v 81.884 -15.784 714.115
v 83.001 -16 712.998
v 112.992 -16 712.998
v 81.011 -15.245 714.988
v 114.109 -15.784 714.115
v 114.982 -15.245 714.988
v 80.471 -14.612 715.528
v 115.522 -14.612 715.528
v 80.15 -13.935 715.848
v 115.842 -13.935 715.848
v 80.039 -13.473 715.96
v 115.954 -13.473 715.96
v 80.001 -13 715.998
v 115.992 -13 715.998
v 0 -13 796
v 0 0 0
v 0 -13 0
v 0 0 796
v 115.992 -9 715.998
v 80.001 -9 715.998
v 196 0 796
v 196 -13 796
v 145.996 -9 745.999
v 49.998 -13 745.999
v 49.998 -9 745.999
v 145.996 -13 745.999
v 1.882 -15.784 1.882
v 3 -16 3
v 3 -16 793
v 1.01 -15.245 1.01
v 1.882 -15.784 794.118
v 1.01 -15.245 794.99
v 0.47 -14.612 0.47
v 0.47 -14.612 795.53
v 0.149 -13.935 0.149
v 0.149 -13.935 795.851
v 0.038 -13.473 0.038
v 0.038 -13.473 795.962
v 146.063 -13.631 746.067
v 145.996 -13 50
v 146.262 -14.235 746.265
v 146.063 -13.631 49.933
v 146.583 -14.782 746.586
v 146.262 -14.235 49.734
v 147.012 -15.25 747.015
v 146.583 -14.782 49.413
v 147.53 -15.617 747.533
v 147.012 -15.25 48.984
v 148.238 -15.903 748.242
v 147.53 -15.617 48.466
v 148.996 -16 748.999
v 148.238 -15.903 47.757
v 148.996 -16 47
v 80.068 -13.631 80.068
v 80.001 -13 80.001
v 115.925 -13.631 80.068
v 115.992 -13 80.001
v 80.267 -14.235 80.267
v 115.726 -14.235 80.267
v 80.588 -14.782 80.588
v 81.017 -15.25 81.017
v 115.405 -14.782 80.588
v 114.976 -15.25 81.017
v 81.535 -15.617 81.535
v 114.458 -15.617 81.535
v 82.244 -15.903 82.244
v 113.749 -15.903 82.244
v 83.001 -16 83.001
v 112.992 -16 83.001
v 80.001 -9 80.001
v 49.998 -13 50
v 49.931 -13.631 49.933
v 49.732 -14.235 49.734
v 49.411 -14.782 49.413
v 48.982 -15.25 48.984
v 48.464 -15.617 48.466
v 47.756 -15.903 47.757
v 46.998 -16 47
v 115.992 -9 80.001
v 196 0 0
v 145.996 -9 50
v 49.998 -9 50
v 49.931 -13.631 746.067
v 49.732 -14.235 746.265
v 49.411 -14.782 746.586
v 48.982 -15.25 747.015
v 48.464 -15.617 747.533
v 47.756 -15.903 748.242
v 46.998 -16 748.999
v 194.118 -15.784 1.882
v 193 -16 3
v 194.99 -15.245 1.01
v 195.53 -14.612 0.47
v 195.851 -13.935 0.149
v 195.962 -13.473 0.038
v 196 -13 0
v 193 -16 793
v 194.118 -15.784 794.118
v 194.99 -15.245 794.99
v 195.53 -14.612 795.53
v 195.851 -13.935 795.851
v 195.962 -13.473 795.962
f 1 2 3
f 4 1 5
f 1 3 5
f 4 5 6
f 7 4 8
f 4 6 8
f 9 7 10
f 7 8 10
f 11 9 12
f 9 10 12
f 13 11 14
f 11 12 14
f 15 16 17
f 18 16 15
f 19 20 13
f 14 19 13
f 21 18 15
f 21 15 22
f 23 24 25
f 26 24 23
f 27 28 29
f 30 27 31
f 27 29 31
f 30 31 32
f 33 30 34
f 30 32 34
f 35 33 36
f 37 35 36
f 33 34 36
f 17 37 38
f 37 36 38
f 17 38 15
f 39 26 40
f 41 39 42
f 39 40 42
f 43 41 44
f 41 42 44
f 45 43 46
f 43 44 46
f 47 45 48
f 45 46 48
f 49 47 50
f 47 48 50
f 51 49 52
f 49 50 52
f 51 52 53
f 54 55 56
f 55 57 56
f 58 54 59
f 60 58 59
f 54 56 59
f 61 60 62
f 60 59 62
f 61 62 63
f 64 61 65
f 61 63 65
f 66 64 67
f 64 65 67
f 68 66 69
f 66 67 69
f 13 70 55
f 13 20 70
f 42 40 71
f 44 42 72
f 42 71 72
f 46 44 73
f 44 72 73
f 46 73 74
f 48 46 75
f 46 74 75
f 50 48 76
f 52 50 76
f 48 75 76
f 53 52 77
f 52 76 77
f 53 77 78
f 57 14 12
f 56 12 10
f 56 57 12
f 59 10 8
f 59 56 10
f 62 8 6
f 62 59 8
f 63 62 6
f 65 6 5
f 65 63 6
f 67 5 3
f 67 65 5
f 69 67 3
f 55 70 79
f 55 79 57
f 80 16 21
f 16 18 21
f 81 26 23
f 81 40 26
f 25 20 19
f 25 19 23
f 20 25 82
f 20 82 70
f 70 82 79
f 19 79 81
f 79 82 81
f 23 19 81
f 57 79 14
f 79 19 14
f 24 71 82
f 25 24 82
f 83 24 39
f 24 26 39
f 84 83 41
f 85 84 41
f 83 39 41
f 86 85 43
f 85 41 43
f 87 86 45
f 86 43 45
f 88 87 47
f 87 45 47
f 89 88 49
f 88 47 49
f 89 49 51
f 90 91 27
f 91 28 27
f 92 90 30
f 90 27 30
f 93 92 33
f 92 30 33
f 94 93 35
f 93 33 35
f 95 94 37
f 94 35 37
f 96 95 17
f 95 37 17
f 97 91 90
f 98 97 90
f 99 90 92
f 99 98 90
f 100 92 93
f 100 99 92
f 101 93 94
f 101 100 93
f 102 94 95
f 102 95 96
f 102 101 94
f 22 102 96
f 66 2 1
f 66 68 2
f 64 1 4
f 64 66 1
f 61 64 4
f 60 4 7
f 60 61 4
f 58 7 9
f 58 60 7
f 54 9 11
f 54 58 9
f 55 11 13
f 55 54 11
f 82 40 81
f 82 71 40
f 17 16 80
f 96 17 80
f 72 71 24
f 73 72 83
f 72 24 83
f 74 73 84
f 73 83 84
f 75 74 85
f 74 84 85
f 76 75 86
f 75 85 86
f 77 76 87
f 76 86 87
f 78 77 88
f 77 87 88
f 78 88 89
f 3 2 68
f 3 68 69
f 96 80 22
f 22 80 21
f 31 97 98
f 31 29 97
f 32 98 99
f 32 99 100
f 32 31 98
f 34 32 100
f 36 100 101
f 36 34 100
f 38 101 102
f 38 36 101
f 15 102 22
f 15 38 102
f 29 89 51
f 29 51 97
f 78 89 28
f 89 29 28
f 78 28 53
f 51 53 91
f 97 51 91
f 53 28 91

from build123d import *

# Parameters (mm, degrees)
F0_W      = 44.656470418
F0_H      = 33.8078811765
F1_DEPTH  = 16
F2_DEPTH  = 796
F3_DEPTH  = 196
F4_W      = 68.9578056335
F4_H      = 493.6993122101
F5_DEPTH  = 7
F6_DEPTH  = 9.7
F7_DEPTH  = 99.33
F8_DEPTH  = 99.33
F9_DEPTH  = 17.34
F10_DEPTH = 102.97
F11_W     = 35.2807044983
F11_H     = 492.0964837074
F12_DEPTH = 7
F13_DEPTH = 37.27
F14_DEPTH = 6.58
F15_DEPTH = 106.63
F16_DEPTH = 5.87
F17_R     = 3


with BuildPart() as f1:
    # F0 (on Front) → F1 (new body)
    with BuildSketch(Plane.XZ):
        with Locations((22.328235209, 16.9039405882)):
            Rectangle(F0_W, F0_H)
    extrude(amount=F1_DEPTH)

    # F2 (add): a face of the model
    f2_faces = [f1.faces().sort_by_distance(p)[0] for p in [
        (22.328235209, -8, 0),
    ]]
    extrude(f2_faces, amount=-F2_DEPTH)

    # F3 (add): a face of the model
    f3_faces = [f1.faces().sort_by_distance(p)[0] for p in [
        (0, -8, 398),
    ]]
    extrude(f3_faces, amount=-F3_DEPTH)

    # F4 (on face) → F5 (cut)
    with BuildSketch(Plane.XZ.offset(16)):
        with Locations((94.1769480705, 399.8196721077)):
            Rectangle(F4_W, F4_H)
    extrude(amount=-F5_DEPTH, mode=Mode.SUBTRACT)

    # F6 (cut): a face of the model
    f6_faces = [f1.faces().sort_by_distance(p)[0] for p in [
        (59.6980452538, -12.5, 399.8196721077),
    ]]
    extrude(f6_faces, amount=-F6_DEPTH, mode=Mode.SUBTRACT)

    # F7 (add): a face of the model
    f7_faces = [f1.faces().sort_by_distance(p)[0] for p in [
        (89.3269480705, -12.5, 646.6693282127),
    ]]
    extrude(f7_faces, amount=-F7_DEPTH)

    # F8 (cut): a face of the model
    f8_faces = [f1.faces().sort_by_distance(p)[0] for p in [
        (89.3269480705, -12.5, 646.6693282127),
    ]]
    extrude(f8_faces, amount=-F8_DEPTH, mode=Mode.SUBTRACT)

    # F9 (cut): a face of the model
    f9_faces = [f1.faces().sort_by_distance(p)[0] for p in [
        (128.6558508873, -12.5, 449.4846721077),
    ]]
    extrude(f9_faces, amount=-F9_DEPTH, mode=Mode.SUBTRACT)

    # F10 (cut): a face of the model
    f10_faces = [f1.faces().sort_by_distance(p)[0] for p in [
        (97.9969480705, -12.5, 152.9700160027),
    ]]
    extrude(f10_faces, amount=-F10_DEPTH, mode=Mode.SUBTRACT)

    # F11 (on face) → F12 (join)
    with BuildSketch(Plane.XZ.offset(9)):
        with Locations((91.7714834213, 432.6795041561)):
            Rectangle(F11_W, F11_H)
    extrude(amount=F12_DEPTH)

    # F13 (add): a face of the model
    f13_faces = [f1.faces().sort_by_distance(p)[0] for p in [
        (91.7714834213, -12.5, 678.7277460098),
    ]]
    extrude(f13_faces, amount=F13_DEPTH)

    # F14 (add): a face of the model
    f14_faces = [f1.faces().sort_by_distance(p)[0] for p in [
        (109.4118356705, -12.5, 451.3145041561),
    ]]
    extrude(f14_faces, amount=F14_DEPTH)

    # F15 (add): a face of the model
    f15_faces = [f1.faces().sort_by_distance(p)[0] for p in [
        (95.0614834213, -12.5, 186.6312623024),
    ]]
    extrude(f15_faces, amount=F15_DEPTH)

    # F16 (cut): a face of the model
    f16_faces = [f1.faces().sort_by_distance(p)[0] for p in [
        (74.1311311722, -12.5, 397.9995041561),
    ]]
    extrude(f16_faces, amount=-F16_DEPTH, mode=Mode.SUBTRACT)

    # F17
    f17_edges = [f1.edges().sort_by_distance(p)[0] for p in [
        (0, -16, 398),
        (98, -16, 0),
        (196, -16, 398),
        (98, -16, 796),
        (145.995851, -16, 397.999672),
        (97.996948, -16, 50.000016),
        (49.998045, -16, 397.999672),
        (97.996948, -16, 745.999328),
        (97.996483, -16, 715.997746),
        (115.991836, -16, 397.999504),
        (97.996483, -16, 80.001262),
        (80.001131, -16, 397.999504),
    ]]
    fillet(f17_edges, radius=F17_R)


solid = f1.part
